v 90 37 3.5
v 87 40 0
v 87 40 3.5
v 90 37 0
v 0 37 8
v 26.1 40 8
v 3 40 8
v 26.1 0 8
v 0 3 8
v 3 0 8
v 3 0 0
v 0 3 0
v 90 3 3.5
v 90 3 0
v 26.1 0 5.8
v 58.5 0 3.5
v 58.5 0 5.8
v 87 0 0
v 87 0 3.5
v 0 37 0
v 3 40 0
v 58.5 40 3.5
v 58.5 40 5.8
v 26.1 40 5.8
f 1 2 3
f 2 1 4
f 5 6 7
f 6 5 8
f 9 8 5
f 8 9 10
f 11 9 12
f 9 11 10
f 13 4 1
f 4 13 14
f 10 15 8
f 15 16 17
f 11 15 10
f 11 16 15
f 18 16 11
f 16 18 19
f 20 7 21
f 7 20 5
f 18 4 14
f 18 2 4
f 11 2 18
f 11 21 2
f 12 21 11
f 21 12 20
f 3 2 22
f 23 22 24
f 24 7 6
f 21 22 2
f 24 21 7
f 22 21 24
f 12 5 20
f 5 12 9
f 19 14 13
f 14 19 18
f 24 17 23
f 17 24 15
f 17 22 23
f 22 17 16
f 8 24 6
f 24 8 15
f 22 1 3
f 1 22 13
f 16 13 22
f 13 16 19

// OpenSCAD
$fn = 32;

// ----------------------------------------------------------------------
// Stepped bar: twostep, 90 x 40 x 8/3.5 mm
// ----------------------------------------------------------------------

// --- parameters (mm) ---
bar_l = 90;               // bar length, X
bar_w = 40;               // bar width, Y
plate_t = 8;              // thickness of the thick zone, Z
thin_t = 3.5;             // thickness of the thin zone
corner_c = 3;             // corner chamfer of the bar
step_cut = 4.5;           // material removed from the thin zone
stair1_x = 26.1;          // position of the first stair
stair2_x = 58.5;          // position of the second stair
mid_t = 5.8;              // thickness of the middle zone
depth_1 = 2.2;            // depth of cut 1 from the top face
depth_2 = 4.5;            // depth of cut 2 from the top face
fit_tol = 0.1;            // declared fit tolerance (prompt contract)
free_tol = 0.3;           // declared free tolerance (prompt contract)

profile = [[3, 0], [87, 0], [90, 3], [90, 37], [87, 40], [3, 40], [0, 37], [0, 3]];  // primary outline, 8 points, counter clockwise
void_1 = [[26.1, -1], [58.5, -1], [58.5, 41], [26.1, 41]];  // first stair, 4 points
void_2 = [[58.5, -1], [91, -1], [91, 41], [58.5, 41]];  // second stair, 4 points

// --- the one profile operation ---
difference() {
  linear_extrude(height = plate_t) polygon(points = profile);
  translate([0, 0, plate_t - depth_1])
    linear_extrude(height = depth_1 + 1) polygon(points = void_1);
  translate([0, 0, plate_t - depth_2])
    linear_extrude(height = depth_2 + 1) polygon(points = void_2);
}
